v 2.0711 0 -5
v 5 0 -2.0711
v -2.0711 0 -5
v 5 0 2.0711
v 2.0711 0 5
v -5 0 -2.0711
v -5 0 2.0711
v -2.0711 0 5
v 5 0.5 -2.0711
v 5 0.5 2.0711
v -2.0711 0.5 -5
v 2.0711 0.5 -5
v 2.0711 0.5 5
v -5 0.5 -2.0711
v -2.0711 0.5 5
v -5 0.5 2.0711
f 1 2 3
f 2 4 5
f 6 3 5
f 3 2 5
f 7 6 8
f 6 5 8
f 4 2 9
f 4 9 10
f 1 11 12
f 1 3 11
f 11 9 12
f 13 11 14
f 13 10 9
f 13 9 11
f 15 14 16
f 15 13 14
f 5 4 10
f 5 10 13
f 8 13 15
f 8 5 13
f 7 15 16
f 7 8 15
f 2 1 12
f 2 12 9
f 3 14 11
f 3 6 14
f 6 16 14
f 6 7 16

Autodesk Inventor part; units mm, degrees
ref_plane "YZ Plane" through (0, 0, 0) normal (1, 0, 0) x (0, 1, 0)
ref_plane "XZ Plane" through (0, 0, 0) normal (0, 1, 0) x (-1, 0, 0)
ref_plane "XY Plane" through (0, 0, 0) normal (0, 0, 1) x (1, 0, 0)
sketch "Sketch1" plane through (0, 0, 0) normal (0, 1, 0) x (-1, 0, 0)
  line L0 (0, -5.2573) -> (-3.0902, -4.2533) construction
  line L1 (-3.0902, -4.2533) -> (-5, -1.6246) construction
  line L2 (-5, -1.6246) -> (-5, 1.6246) construction
  line L3 (-5, 1.6246) -> (-3.0902, 4.2533) construction
  line L4 (-3.0902, 4.2533) -> (0, 5.2573) construction
  line L5 (0, 5.2573) -> (3.0902, 4.2533) construction
  line L6 (3.0902, 4.2533) -> (5, 1.6246) construction
  line L7 (5, 1.6246) -> (5, -1.6246) construction
  line L8 (5, -1.6246) -> (3.0902, -4.2533) construction
  line L9 (3.0902, -4.2533) -> (0, -5.2573) construction
  line L10 (-2.0711, -5) -> (-5, -2.0711)
  line L11 (-5, -2.0711) -> (-5, 2.0711)
  line L12 (-5, 2.0711) -> (-2.0711, 5)
  line L13 (-2.0711, 5) -> (2.0711, 5)
  line L14 (2.0711, 5) -> (5, 2.0711)
  line L15 (5, 2.0711) -> (5, -2.0711)
  line L16 (5, -2.0711) -> (2.0711, -5)
  line L17 (2.0711, -5) -> (-2.0711, -5)
  line L18 (0, 0) -> (-10.1721, 0) construction
  dimension "d0" = 10
  dimension "d3" = 10
extrude "Extrusion1" add sketch "Sketch1" along normal blind 0.5
properties part number "Substrate"
